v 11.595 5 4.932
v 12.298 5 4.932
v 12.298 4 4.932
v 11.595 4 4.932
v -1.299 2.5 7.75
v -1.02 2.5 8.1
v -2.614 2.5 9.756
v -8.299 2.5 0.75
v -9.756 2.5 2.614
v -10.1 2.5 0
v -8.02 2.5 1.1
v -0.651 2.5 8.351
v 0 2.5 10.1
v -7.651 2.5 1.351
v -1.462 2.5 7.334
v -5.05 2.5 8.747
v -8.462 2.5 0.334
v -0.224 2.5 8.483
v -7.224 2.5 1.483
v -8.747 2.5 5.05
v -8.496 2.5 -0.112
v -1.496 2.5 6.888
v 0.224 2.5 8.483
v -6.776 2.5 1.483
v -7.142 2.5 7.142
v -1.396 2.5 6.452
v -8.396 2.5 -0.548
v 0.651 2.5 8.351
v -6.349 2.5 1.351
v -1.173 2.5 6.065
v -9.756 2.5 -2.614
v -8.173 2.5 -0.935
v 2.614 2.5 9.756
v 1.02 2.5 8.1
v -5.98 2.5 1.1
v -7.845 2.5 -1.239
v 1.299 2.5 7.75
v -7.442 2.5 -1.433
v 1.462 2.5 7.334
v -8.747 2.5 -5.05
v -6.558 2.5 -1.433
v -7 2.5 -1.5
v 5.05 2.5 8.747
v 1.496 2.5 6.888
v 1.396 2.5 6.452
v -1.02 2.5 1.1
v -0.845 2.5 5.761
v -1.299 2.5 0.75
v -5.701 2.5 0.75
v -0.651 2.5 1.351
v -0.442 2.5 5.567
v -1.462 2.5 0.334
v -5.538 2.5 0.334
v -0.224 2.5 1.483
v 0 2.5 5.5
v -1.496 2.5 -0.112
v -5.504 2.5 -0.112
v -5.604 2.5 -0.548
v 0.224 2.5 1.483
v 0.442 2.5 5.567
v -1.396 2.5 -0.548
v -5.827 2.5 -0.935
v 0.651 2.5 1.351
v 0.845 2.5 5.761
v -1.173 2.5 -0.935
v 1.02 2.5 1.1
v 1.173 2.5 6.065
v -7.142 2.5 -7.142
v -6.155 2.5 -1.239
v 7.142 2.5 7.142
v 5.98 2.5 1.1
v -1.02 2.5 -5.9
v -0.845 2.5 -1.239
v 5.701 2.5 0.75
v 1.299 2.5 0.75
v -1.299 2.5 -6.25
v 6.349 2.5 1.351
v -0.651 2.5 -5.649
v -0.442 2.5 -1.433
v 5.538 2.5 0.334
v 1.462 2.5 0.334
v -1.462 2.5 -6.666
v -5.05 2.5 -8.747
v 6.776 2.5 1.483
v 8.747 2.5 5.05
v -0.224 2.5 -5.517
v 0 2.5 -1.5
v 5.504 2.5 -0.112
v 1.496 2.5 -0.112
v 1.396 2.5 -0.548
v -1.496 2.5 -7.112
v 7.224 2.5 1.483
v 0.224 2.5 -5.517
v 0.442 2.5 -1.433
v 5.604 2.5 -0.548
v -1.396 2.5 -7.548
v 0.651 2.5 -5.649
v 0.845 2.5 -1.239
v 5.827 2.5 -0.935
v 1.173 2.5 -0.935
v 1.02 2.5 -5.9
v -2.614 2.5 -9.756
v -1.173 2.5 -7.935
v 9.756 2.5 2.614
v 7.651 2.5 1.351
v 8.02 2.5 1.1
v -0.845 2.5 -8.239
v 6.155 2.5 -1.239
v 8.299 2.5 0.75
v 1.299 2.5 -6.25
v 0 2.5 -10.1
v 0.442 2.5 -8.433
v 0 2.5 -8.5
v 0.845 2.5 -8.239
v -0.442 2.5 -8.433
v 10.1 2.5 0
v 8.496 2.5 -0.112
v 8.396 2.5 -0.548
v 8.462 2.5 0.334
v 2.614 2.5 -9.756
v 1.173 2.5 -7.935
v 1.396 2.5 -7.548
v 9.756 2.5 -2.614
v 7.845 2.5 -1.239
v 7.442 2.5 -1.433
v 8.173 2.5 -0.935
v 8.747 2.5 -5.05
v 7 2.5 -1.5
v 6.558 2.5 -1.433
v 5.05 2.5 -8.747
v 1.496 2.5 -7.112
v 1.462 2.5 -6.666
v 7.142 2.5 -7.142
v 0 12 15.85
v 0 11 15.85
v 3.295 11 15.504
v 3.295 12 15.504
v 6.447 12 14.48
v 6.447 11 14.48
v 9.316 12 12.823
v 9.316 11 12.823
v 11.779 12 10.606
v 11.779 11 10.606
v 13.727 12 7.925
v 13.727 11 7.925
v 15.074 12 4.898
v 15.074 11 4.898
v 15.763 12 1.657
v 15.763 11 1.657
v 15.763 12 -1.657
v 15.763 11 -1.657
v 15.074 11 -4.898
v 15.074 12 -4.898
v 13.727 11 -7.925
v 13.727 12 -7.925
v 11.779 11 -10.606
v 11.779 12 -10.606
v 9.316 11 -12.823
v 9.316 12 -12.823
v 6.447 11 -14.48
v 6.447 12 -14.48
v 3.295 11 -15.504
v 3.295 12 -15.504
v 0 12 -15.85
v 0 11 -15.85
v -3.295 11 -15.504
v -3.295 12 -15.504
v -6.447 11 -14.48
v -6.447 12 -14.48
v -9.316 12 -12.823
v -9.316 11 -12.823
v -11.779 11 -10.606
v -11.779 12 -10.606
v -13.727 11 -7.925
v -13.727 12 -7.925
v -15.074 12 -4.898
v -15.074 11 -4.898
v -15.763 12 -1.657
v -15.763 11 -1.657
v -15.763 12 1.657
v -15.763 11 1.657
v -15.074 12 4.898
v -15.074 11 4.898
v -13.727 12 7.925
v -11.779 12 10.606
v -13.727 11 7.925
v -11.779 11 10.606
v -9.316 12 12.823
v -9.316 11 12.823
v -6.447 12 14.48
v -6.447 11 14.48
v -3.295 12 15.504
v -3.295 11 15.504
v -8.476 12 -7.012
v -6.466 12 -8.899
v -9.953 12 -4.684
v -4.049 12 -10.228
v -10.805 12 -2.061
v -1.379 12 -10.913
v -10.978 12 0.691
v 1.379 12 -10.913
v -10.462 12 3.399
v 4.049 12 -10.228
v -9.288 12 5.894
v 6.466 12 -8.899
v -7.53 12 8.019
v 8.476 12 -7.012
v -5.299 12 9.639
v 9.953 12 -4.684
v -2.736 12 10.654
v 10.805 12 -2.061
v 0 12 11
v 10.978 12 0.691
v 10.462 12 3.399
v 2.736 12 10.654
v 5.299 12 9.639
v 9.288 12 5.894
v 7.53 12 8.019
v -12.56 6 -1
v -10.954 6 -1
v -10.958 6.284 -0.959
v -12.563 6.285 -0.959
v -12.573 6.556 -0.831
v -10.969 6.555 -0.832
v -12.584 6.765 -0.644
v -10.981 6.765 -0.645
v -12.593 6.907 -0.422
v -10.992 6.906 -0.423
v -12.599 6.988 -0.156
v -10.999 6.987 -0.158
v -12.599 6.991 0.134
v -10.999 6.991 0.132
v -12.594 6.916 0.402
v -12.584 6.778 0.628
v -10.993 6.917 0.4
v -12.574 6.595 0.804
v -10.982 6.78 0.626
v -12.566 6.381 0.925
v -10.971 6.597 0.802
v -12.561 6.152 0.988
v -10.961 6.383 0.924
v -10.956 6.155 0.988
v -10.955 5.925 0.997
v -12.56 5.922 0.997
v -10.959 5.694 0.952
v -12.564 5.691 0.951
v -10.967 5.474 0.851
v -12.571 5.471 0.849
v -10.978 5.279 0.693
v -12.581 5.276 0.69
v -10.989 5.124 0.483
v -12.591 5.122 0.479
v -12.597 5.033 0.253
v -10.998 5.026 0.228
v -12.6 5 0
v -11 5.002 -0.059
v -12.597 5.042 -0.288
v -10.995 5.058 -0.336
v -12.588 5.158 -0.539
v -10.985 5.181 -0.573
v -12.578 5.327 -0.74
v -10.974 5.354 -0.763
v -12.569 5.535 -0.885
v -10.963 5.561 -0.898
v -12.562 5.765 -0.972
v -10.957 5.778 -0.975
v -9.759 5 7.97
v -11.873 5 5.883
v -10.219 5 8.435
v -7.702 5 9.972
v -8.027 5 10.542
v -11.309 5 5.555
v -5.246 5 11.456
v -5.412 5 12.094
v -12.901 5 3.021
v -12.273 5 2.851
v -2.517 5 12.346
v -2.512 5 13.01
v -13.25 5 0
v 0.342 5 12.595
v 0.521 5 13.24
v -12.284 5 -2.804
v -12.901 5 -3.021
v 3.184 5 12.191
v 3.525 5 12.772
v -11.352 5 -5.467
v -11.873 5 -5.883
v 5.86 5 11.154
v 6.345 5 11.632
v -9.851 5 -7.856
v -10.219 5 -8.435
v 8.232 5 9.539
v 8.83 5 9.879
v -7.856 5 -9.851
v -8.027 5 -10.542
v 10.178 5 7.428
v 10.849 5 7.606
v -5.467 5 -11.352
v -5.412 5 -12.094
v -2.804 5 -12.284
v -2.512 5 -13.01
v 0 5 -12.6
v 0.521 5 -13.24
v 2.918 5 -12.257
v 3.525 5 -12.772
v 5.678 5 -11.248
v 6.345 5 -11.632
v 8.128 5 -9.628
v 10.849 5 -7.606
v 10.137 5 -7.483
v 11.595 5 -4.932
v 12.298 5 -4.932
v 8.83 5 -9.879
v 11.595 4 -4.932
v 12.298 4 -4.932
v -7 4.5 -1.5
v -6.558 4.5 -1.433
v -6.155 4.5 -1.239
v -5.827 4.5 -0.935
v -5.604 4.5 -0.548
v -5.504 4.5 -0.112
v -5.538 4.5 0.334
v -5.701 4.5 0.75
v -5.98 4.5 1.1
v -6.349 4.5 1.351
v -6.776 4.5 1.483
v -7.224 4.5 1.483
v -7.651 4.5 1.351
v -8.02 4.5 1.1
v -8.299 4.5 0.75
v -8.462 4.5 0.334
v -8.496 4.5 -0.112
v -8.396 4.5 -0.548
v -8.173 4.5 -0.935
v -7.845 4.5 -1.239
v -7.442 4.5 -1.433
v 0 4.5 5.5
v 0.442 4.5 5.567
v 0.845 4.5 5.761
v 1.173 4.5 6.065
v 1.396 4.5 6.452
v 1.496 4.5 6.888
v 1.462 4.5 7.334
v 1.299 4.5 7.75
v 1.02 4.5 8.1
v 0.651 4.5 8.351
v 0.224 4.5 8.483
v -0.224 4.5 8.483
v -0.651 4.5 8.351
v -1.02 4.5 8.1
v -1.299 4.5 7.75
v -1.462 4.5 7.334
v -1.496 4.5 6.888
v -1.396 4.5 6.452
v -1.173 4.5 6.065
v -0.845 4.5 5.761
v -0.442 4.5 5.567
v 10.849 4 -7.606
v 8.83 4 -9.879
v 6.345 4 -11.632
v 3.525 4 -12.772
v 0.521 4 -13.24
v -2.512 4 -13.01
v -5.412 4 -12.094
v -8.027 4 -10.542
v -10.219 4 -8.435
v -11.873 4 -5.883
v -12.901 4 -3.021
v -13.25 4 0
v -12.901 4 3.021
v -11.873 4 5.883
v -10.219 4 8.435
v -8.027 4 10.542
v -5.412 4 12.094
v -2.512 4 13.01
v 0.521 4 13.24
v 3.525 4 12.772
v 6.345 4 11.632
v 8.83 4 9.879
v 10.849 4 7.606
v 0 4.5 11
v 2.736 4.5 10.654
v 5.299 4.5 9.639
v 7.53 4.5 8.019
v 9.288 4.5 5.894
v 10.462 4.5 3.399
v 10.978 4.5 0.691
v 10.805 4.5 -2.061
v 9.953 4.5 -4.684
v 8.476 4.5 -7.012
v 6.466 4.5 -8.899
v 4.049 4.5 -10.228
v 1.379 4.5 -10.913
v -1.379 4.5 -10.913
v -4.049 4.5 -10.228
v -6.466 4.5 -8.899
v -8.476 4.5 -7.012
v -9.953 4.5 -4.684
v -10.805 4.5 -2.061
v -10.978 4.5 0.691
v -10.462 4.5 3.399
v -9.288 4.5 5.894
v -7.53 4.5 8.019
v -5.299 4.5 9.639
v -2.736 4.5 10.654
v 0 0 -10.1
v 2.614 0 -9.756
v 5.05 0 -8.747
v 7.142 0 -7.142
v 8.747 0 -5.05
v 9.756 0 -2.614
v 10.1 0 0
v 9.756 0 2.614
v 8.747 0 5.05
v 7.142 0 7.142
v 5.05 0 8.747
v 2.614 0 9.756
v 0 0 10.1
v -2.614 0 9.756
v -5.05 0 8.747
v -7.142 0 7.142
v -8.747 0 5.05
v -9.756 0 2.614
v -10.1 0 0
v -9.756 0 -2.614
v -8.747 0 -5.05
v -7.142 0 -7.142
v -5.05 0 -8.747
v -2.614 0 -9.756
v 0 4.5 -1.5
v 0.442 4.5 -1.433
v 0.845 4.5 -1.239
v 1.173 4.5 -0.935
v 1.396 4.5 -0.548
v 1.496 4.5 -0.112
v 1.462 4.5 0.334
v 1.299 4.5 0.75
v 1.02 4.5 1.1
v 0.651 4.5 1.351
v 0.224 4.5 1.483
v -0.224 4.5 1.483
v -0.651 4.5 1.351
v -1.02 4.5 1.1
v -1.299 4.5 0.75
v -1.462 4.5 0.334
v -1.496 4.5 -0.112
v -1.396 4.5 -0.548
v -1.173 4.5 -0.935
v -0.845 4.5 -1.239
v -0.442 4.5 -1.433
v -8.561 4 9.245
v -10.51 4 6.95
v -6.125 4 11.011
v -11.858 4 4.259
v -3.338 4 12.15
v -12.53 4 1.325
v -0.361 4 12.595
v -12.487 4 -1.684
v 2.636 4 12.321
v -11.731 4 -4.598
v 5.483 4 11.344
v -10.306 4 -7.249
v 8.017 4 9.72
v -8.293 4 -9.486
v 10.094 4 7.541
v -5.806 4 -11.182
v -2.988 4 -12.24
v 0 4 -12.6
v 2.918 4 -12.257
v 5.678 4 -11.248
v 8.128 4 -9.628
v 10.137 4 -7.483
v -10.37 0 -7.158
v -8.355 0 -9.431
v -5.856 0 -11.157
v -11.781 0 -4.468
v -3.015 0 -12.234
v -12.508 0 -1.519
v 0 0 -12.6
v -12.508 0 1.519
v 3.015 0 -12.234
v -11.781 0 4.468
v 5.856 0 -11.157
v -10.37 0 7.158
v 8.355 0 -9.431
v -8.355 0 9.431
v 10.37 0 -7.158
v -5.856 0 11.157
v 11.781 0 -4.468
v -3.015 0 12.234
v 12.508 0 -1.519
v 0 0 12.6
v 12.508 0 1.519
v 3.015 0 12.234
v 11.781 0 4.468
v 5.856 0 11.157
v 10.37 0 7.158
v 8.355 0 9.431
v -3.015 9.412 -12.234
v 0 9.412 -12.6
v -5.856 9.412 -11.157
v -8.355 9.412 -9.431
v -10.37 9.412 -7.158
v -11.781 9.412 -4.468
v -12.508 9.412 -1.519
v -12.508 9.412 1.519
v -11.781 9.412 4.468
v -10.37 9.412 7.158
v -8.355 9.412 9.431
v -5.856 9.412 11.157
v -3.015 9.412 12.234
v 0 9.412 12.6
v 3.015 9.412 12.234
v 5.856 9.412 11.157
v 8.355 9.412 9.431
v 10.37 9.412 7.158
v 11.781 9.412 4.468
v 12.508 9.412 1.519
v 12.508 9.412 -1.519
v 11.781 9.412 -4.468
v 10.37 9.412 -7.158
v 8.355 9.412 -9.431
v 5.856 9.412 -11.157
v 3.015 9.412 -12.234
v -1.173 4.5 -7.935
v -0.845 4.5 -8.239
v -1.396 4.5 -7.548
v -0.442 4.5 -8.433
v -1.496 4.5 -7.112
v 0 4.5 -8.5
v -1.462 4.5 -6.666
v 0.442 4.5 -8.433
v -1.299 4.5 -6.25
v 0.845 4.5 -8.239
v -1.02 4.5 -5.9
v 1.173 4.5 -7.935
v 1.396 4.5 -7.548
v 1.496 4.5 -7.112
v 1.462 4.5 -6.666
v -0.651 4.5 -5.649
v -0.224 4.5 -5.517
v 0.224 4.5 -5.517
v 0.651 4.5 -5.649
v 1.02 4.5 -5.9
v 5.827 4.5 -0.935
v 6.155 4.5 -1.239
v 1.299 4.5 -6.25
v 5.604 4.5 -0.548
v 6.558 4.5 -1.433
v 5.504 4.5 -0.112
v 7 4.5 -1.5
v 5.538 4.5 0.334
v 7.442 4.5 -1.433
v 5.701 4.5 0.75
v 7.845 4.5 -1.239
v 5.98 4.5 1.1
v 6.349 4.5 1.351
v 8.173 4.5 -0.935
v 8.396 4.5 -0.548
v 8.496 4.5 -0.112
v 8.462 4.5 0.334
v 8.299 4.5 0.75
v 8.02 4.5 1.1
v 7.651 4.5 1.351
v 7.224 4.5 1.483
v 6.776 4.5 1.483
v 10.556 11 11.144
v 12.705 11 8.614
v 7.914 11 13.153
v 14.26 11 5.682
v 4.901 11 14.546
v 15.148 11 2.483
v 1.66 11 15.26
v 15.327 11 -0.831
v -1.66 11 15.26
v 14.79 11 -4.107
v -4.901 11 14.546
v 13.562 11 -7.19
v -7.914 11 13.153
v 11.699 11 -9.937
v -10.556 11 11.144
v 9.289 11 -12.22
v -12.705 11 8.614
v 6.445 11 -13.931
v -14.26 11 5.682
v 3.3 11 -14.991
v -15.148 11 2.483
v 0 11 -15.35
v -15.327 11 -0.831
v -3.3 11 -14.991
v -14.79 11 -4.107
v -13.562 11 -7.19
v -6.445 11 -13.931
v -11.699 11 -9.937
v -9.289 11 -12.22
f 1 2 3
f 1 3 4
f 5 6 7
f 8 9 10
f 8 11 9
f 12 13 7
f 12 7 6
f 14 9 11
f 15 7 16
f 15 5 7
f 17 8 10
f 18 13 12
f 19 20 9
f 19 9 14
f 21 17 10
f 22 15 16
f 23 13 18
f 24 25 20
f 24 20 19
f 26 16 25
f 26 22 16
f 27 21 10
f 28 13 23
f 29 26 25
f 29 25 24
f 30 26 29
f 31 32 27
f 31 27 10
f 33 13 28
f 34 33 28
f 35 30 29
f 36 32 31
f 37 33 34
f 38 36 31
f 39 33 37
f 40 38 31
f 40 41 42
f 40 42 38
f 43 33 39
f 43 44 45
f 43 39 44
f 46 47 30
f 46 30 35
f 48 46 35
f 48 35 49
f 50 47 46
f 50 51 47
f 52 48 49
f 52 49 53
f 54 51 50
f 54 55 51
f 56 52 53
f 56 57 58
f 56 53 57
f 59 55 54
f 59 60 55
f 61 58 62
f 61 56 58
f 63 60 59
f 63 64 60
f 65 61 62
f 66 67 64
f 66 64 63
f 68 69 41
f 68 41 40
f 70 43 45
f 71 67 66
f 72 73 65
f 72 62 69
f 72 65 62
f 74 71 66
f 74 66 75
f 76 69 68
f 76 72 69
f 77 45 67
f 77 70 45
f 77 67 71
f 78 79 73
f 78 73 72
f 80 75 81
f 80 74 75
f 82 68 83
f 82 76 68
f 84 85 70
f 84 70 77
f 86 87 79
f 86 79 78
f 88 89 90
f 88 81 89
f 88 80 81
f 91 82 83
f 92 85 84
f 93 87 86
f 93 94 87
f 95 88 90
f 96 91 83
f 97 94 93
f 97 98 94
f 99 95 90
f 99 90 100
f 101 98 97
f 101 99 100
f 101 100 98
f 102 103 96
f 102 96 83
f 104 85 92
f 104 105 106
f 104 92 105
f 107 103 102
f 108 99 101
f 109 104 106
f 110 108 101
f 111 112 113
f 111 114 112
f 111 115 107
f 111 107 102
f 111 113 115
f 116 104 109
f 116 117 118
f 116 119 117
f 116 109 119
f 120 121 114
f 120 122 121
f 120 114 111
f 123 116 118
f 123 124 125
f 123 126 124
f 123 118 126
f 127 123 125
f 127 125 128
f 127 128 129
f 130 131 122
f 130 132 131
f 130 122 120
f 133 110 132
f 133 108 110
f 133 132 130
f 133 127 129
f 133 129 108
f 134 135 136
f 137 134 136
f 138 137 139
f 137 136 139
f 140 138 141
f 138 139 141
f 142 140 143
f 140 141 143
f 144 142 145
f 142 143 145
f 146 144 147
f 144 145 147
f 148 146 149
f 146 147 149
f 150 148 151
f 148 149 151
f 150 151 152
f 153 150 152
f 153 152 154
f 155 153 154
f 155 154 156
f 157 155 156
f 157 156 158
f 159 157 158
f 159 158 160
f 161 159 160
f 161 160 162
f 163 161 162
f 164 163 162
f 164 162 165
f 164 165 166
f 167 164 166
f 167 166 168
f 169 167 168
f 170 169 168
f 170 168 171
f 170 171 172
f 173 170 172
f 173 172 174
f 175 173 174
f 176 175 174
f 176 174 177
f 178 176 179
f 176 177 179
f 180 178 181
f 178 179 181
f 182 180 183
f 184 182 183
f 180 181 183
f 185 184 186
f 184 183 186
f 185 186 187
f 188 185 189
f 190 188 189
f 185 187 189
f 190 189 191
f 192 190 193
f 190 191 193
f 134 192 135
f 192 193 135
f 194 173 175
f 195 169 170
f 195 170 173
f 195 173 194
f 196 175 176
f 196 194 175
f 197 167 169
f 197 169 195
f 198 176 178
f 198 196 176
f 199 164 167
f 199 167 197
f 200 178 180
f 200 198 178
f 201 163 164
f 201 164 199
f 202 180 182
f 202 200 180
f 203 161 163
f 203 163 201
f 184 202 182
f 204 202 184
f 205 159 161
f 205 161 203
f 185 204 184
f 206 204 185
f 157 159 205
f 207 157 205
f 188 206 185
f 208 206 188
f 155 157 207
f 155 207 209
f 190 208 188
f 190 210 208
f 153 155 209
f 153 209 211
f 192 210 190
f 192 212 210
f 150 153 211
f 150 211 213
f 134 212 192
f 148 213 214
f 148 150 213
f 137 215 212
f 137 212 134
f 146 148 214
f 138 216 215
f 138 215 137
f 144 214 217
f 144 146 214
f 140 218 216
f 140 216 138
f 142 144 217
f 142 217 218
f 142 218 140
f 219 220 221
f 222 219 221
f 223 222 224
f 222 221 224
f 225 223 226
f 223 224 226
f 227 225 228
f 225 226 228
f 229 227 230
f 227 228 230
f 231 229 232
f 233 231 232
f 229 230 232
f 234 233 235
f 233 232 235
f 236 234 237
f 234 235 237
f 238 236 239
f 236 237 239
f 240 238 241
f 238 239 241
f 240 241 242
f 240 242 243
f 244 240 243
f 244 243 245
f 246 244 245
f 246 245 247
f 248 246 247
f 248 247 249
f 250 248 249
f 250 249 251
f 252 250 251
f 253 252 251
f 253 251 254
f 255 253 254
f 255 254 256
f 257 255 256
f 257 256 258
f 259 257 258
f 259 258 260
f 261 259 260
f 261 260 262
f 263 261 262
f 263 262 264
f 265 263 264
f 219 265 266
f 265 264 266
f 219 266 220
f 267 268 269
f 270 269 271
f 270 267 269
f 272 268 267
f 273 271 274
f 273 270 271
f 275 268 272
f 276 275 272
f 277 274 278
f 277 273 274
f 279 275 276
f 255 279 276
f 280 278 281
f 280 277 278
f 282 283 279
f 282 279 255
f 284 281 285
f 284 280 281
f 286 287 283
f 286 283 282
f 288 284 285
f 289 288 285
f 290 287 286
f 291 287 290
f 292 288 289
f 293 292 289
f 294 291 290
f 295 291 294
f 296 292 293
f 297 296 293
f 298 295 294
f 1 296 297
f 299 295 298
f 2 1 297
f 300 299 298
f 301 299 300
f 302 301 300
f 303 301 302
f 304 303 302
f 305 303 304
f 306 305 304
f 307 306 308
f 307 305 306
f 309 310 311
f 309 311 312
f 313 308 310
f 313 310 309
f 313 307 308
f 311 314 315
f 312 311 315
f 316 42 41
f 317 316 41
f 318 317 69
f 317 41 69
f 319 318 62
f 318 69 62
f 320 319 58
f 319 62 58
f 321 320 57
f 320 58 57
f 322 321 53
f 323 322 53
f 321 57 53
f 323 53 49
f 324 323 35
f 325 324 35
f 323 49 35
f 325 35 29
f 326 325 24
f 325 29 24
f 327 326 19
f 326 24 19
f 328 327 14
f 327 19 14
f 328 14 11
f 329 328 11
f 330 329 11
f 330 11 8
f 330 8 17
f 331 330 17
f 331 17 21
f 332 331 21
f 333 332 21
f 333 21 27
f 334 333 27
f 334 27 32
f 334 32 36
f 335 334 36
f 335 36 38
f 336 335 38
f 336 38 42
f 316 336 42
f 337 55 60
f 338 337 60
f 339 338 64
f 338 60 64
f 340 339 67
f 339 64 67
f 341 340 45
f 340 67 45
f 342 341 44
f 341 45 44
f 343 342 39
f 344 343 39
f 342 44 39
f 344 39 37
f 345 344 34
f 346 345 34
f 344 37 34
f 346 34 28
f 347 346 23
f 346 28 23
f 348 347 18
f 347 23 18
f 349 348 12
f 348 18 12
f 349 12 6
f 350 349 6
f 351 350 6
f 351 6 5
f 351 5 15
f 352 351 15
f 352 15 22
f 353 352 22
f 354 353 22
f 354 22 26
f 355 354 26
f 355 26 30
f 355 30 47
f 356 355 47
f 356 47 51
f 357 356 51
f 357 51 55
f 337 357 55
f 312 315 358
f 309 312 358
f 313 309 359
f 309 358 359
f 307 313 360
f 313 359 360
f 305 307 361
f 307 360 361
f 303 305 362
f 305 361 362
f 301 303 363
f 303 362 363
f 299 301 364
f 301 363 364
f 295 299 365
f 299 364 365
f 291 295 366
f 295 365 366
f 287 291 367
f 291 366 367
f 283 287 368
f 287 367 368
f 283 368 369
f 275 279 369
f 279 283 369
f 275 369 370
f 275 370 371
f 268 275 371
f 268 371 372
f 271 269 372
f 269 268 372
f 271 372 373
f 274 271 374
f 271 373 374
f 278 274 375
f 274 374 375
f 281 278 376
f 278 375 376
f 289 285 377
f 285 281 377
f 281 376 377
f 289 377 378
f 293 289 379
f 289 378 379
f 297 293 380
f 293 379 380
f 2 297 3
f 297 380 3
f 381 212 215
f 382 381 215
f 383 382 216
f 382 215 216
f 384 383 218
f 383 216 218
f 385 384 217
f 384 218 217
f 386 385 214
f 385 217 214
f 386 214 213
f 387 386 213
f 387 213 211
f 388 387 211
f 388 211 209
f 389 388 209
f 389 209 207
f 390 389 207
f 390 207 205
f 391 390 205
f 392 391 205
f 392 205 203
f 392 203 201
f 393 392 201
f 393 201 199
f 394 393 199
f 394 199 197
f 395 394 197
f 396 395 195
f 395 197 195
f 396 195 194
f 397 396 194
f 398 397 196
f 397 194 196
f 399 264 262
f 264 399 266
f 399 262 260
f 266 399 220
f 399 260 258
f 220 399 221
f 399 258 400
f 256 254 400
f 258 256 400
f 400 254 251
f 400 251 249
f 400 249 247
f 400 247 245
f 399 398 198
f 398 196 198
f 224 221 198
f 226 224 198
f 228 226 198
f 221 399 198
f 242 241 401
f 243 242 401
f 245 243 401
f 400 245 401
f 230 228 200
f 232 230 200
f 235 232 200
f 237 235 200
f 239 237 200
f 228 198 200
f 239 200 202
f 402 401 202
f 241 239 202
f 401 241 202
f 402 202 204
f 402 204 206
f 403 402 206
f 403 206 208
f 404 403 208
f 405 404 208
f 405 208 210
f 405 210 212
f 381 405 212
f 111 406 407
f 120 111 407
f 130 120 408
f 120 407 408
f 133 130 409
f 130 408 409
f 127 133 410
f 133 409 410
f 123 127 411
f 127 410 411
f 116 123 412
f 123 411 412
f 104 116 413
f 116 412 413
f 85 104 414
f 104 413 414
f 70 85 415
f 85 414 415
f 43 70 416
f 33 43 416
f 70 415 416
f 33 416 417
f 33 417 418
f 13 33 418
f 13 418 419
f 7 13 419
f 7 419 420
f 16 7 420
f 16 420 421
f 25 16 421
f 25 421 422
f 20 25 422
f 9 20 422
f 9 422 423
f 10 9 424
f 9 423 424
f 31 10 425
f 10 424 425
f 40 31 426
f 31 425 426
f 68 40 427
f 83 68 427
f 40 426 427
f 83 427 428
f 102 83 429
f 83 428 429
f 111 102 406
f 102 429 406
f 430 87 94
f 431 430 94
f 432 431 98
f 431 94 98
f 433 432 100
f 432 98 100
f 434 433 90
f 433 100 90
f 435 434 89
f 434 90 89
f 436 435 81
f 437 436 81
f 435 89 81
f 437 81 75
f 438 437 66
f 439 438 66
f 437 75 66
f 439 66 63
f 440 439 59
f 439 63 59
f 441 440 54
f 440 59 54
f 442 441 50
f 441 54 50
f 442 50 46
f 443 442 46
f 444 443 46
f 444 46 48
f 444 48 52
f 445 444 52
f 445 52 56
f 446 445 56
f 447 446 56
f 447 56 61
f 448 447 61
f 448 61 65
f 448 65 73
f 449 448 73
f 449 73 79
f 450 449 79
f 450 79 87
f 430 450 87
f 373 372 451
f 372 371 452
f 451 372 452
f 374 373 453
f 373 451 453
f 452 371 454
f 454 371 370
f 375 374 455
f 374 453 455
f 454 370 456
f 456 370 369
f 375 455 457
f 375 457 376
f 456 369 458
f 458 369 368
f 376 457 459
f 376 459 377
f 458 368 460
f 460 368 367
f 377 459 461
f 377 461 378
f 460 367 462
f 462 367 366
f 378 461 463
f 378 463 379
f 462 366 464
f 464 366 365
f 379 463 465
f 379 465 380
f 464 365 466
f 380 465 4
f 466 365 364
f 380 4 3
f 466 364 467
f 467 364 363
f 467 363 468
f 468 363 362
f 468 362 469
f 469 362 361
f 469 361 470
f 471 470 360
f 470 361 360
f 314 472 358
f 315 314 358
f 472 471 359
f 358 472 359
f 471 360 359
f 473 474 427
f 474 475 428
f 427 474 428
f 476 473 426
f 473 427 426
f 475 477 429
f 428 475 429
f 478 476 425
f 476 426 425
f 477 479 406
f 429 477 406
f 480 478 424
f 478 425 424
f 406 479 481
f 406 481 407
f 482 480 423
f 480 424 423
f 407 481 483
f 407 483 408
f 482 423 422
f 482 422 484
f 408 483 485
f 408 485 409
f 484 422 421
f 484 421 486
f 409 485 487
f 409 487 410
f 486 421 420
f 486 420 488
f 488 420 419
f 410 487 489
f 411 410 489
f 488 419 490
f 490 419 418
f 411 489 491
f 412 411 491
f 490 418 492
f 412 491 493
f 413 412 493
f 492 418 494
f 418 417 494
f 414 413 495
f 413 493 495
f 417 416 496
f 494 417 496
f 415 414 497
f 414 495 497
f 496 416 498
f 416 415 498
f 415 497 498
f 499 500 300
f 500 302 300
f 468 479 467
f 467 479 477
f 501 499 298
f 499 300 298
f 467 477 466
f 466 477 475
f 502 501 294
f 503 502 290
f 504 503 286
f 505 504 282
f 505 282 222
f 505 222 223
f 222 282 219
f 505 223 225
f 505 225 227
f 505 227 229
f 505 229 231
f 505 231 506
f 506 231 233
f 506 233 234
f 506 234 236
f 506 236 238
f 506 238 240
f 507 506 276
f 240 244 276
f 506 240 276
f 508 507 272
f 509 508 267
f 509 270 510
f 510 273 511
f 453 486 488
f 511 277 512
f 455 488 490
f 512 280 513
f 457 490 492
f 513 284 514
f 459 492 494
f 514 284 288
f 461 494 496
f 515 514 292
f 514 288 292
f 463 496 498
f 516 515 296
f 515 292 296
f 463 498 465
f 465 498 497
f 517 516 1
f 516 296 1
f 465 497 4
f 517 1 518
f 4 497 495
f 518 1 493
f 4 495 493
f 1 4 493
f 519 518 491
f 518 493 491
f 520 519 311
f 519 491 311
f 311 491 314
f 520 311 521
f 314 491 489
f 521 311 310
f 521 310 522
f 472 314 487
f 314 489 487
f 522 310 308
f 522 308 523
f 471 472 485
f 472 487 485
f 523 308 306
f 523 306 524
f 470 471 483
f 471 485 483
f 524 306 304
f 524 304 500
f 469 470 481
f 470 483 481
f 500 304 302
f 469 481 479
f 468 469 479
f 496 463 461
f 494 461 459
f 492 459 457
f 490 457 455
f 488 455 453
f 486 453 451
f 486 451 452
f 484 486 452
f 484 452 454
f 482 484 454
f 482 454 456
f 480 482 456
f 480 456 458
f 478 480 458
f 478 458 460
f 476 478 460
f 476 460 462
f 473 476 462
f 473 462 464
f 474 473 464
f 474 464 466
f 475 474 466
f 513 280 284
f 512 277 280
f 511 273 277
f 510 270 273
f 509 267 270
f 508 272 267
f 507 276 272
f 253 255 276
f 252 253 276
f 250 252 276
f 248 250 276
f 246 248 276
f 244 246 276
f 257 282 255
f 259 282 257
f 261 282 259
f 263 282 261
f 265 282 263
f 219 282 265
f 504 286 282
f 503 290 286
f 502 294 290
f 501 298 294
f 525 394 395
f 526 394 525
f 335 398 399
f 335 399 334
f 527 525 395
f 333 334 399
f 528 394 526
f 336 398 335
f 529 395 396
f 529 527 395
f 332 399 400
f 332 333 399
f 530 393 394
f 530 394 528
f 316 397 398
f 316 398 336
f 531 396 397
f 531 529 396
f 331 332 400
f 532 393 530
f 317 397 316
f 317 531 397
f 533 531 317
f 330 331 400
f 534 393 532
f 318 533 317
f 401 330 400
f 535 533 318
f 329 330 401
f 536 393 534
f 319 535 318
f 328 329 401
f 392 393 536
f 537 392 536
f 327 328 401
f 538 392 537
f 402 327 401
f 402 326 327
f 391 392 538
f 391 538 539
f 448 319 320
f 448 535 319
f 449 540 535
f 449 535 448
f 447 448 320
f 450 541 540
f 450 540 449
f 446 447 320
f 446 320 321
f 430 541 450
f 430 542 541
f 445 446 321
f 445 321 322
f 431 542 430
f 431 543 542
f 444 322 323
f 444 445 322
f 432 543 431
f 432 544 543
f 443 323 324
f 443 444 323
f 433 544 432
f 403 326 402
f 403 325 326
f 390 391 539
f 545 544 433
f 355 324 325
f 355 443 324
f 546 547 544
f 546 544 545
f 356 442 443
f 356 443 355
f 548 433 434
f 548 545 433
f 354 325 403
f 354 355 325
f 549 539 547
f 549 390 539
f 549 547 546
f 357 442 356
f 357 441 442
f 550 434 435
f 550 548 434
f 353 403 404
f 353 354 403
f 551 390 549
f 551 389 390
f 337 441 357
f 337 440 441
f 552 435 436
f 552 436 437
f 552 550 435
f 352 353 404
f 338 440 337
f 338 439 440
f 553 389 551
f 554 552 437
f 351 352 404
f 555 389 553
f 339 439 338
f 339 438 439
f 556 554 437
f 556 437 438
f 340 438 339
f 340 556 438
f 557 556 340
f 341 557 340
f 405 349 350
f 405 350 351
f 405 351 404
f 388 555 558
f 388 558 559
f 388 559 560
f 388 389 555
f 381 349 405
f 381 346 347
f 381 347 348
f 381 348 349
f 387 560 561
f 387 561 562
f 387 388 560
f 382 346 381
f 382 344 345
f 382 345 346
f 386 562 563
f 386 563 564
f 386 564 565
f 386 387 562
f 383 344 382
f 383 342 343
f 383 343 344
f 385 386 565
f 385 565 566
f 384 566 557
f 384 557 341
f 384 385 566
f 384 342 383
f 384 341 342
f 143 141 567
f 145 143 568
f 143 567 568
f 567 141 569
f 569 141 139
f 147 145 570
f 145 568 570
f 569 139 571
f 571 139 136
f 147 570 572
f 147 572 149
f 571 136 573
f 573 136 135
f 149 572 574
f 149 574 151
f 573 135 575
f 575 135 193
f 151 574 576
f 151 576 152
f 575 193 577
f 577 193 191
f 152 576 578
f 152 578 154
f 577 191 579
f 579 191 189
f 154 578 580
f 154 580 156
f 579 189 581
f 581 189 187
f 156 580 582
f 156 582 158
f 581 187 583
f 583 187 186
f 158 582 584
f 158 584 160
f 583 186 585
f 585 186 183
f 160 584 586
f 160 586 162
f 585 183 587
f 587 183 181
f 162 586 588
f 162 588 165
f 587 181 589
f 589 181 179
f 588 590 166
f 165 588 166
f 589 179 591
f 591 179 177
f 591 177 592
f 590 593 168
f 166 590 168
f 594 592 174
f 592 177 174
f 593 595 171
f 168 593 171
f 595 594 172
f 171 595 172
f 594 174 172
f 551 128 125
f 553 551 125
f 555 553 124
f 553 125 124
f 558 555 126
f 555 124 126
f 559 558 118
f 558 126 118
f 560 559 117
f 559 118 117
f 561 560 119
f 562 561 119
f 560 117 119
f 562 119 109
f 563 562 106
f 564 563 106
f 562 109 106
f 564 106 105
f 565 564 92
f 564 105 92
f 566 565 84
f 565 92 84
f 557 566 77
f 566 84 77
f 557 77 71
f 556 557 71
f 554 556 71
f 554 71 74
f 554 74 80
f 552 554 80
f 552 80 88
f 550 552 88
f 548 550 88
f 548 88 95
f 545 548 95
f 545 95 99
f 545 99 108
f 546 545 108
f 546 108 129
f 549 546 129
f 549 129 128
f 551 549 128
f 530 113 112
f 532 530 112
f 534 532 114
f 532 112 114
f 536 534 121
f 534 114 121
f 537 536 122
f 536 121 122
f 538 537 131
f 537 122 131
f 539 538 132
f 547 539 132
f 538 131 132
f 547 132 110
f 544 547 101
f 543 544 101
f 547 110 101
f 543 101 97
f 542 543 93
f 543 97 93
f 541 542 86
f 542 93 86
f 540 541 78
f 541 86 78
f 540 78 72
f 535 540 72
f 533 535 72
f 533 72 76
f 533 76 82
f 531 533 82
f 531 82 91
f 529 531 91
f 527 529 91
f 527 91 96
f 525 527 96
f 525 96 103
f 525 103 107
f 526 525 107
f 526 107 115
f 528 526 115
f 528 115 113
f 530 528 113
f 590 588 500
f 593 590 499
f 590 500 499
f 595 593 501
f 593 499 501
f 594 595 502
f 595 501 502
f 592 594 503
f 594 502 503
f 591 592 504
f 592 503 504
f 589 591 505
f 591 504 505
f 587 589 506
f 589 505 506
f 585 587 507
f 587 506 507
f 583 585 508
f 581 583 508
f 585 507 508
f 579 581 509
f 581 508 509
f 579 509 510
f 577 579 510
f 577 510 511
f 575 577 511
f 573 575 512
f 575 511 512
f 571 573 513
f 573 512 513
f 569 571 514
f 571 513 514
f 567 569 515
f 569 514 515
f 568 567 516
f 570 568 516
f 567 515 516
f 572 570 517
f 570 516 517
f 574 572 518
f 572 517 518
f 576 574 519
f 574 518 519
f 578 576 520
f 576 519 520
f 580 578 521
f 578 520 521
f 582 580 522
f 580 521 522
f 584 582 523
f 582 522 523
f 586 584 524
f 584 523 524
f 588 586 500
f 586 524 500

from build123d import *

# Parameters (mm, degrees)
SKETCH_1_R          = 15.85
EXTRUDE_1_DEPTH     = 12
SKETCH_2_R          = 10.1
CUT_EXTRUDE_1_DEPTH = 2.5
SKETCH_3_R          = 11
CUT_EXTRUDE_2_DEPTH = 7.5
SKETCH_4_R          = 1.5
CUT_EXTRUDE_3_DEPTH = 6
EXTRUDE_2_DEPTH     = 1
SKETCH_7_R          = 1
CUT_EXTRUDE_4_DEPTH = 16


with BuildPart() as part:
    # 草图1 → 凸台-拉伸1 (new body)
    with BuildSketch(Plane(origin=(0, 0, 0), x_dir=(1, 0, 0), z_dir=(0, 1, 0))):
        with Locations(Location((0, 0, 0), (0, 0, 270))):
            Circle(SKETCH_1_R)
    extrude(amount=EXTRUDE_1_DEPTH)

    # 草图2 → 切除-拉伸1 (cut)
    with BuildSketch(Plane.XZ):
        with Locations(Location((0, 0, 0), (0, 0, 270))):
            Circle(SKETCH_2_R)
    extrude(amount=-CUT_EXTRUDE_1_DEPTH, mode=Mode.SUBTRACT)

    # 草图3 → 切除-拉伸2 (cut)
    with BuildSketch(Plane(origin=(0, 12, 0), x_dir=(1, 0, 0), z_dir=(0, 1, 0))):
        with Locations(Location((0, 0, 0), (0, 0, 270))):
            Circle(SKETCH_3_R)
    extrude(amount=-CUT_EXTRUDE_2_DEPTH, mode=Mode.SUBTRACT)

    # 草图4 → 切除-拉伸3 (cut)
    with BuildSketch(Plane.XZ.offset(-2.5)):
        with Locations(Location((0, 7, 0), (0, 0, 270))):
            Circle(SKETCH_4_R)
        with Locations(Location((7, 0, 0), (0, 0, 270))):
            Circle(SKETCH_4_R)
        with Locations(Location((0, -7, 0), (0, 0, 270))):
            Circle(SKETCH_4_R)
        with Locations(Location((-7, 0, 0), (0, 0, 270))):
            Circle(SKETCH_4_R)
        with Locations(Location((0, 0, 0), (0, 0, 270))):
            Circle(SKETCH_4_R)
    extrude(amount=-CUT_EXTRUDE_3_DEPTH, mode=Mode.SUBTRACT)

    # 草图5 → 切除-旋转1 (revolve, cut)
    with BuildSketch(Plane(origin=(0, 0, 0), x_dir=(0, 0, -1), z_dir=(1, 0, 0)), mode=Mode.PRIVATE) as cut_revolve_1_sk:
        Polygon((-15.35, 11), (-12.6, 9.41228676), (-12.6, 0), (-15.85, 0), (-15.85, 11), align=None)
    revolve(cut_revolve_1_sk.sketch.rotate(Axis((0, -0.5, 0), (0, 1, 0)), 180), axis=Axis((0, -0.5, 0), (0, 1, 0)), mode=Mode.SUBTRACT)

    # 草图6 → 凸台-拉伸2 (add)
    with BuildSketch(Plane(origin=(0, 4, 0), x_dir=(1, 0, 0), z_dir=(0, 1, 0))):
        with BuildLine():
            Line((11.485757101, 4.932279778), (12.297768749, 4.932279778))
            ThreePointArc((12.297768749, 4.932279778), (-13.25, 0), (12.297768749, -4.932279778))
            Line((12.297768749, -4.932279778), (11.485757101, -4.932279778))
            ThreePointArc((11.485757101, -4.932279778), (-12.5, 0), (11.485757101, 4.932279778))
        make_face()
    extrude(amount=EXTRUDE_2_DEPTH)

    # 草图7 → 切除-拉伸4 (cut)
    with BuildSketch(Plane(origin=(0, 0, 0), x_dir=(0, 0, -1), z_dir=(1, 0, 0))):
        with Locations((0, 6)):
            Circle(SKETCH_7_R)
    extrude(amount=-CUT_EXTRUDE_4_DEPTH, mode=Mode.SUBTRACT)


solid = part.part
